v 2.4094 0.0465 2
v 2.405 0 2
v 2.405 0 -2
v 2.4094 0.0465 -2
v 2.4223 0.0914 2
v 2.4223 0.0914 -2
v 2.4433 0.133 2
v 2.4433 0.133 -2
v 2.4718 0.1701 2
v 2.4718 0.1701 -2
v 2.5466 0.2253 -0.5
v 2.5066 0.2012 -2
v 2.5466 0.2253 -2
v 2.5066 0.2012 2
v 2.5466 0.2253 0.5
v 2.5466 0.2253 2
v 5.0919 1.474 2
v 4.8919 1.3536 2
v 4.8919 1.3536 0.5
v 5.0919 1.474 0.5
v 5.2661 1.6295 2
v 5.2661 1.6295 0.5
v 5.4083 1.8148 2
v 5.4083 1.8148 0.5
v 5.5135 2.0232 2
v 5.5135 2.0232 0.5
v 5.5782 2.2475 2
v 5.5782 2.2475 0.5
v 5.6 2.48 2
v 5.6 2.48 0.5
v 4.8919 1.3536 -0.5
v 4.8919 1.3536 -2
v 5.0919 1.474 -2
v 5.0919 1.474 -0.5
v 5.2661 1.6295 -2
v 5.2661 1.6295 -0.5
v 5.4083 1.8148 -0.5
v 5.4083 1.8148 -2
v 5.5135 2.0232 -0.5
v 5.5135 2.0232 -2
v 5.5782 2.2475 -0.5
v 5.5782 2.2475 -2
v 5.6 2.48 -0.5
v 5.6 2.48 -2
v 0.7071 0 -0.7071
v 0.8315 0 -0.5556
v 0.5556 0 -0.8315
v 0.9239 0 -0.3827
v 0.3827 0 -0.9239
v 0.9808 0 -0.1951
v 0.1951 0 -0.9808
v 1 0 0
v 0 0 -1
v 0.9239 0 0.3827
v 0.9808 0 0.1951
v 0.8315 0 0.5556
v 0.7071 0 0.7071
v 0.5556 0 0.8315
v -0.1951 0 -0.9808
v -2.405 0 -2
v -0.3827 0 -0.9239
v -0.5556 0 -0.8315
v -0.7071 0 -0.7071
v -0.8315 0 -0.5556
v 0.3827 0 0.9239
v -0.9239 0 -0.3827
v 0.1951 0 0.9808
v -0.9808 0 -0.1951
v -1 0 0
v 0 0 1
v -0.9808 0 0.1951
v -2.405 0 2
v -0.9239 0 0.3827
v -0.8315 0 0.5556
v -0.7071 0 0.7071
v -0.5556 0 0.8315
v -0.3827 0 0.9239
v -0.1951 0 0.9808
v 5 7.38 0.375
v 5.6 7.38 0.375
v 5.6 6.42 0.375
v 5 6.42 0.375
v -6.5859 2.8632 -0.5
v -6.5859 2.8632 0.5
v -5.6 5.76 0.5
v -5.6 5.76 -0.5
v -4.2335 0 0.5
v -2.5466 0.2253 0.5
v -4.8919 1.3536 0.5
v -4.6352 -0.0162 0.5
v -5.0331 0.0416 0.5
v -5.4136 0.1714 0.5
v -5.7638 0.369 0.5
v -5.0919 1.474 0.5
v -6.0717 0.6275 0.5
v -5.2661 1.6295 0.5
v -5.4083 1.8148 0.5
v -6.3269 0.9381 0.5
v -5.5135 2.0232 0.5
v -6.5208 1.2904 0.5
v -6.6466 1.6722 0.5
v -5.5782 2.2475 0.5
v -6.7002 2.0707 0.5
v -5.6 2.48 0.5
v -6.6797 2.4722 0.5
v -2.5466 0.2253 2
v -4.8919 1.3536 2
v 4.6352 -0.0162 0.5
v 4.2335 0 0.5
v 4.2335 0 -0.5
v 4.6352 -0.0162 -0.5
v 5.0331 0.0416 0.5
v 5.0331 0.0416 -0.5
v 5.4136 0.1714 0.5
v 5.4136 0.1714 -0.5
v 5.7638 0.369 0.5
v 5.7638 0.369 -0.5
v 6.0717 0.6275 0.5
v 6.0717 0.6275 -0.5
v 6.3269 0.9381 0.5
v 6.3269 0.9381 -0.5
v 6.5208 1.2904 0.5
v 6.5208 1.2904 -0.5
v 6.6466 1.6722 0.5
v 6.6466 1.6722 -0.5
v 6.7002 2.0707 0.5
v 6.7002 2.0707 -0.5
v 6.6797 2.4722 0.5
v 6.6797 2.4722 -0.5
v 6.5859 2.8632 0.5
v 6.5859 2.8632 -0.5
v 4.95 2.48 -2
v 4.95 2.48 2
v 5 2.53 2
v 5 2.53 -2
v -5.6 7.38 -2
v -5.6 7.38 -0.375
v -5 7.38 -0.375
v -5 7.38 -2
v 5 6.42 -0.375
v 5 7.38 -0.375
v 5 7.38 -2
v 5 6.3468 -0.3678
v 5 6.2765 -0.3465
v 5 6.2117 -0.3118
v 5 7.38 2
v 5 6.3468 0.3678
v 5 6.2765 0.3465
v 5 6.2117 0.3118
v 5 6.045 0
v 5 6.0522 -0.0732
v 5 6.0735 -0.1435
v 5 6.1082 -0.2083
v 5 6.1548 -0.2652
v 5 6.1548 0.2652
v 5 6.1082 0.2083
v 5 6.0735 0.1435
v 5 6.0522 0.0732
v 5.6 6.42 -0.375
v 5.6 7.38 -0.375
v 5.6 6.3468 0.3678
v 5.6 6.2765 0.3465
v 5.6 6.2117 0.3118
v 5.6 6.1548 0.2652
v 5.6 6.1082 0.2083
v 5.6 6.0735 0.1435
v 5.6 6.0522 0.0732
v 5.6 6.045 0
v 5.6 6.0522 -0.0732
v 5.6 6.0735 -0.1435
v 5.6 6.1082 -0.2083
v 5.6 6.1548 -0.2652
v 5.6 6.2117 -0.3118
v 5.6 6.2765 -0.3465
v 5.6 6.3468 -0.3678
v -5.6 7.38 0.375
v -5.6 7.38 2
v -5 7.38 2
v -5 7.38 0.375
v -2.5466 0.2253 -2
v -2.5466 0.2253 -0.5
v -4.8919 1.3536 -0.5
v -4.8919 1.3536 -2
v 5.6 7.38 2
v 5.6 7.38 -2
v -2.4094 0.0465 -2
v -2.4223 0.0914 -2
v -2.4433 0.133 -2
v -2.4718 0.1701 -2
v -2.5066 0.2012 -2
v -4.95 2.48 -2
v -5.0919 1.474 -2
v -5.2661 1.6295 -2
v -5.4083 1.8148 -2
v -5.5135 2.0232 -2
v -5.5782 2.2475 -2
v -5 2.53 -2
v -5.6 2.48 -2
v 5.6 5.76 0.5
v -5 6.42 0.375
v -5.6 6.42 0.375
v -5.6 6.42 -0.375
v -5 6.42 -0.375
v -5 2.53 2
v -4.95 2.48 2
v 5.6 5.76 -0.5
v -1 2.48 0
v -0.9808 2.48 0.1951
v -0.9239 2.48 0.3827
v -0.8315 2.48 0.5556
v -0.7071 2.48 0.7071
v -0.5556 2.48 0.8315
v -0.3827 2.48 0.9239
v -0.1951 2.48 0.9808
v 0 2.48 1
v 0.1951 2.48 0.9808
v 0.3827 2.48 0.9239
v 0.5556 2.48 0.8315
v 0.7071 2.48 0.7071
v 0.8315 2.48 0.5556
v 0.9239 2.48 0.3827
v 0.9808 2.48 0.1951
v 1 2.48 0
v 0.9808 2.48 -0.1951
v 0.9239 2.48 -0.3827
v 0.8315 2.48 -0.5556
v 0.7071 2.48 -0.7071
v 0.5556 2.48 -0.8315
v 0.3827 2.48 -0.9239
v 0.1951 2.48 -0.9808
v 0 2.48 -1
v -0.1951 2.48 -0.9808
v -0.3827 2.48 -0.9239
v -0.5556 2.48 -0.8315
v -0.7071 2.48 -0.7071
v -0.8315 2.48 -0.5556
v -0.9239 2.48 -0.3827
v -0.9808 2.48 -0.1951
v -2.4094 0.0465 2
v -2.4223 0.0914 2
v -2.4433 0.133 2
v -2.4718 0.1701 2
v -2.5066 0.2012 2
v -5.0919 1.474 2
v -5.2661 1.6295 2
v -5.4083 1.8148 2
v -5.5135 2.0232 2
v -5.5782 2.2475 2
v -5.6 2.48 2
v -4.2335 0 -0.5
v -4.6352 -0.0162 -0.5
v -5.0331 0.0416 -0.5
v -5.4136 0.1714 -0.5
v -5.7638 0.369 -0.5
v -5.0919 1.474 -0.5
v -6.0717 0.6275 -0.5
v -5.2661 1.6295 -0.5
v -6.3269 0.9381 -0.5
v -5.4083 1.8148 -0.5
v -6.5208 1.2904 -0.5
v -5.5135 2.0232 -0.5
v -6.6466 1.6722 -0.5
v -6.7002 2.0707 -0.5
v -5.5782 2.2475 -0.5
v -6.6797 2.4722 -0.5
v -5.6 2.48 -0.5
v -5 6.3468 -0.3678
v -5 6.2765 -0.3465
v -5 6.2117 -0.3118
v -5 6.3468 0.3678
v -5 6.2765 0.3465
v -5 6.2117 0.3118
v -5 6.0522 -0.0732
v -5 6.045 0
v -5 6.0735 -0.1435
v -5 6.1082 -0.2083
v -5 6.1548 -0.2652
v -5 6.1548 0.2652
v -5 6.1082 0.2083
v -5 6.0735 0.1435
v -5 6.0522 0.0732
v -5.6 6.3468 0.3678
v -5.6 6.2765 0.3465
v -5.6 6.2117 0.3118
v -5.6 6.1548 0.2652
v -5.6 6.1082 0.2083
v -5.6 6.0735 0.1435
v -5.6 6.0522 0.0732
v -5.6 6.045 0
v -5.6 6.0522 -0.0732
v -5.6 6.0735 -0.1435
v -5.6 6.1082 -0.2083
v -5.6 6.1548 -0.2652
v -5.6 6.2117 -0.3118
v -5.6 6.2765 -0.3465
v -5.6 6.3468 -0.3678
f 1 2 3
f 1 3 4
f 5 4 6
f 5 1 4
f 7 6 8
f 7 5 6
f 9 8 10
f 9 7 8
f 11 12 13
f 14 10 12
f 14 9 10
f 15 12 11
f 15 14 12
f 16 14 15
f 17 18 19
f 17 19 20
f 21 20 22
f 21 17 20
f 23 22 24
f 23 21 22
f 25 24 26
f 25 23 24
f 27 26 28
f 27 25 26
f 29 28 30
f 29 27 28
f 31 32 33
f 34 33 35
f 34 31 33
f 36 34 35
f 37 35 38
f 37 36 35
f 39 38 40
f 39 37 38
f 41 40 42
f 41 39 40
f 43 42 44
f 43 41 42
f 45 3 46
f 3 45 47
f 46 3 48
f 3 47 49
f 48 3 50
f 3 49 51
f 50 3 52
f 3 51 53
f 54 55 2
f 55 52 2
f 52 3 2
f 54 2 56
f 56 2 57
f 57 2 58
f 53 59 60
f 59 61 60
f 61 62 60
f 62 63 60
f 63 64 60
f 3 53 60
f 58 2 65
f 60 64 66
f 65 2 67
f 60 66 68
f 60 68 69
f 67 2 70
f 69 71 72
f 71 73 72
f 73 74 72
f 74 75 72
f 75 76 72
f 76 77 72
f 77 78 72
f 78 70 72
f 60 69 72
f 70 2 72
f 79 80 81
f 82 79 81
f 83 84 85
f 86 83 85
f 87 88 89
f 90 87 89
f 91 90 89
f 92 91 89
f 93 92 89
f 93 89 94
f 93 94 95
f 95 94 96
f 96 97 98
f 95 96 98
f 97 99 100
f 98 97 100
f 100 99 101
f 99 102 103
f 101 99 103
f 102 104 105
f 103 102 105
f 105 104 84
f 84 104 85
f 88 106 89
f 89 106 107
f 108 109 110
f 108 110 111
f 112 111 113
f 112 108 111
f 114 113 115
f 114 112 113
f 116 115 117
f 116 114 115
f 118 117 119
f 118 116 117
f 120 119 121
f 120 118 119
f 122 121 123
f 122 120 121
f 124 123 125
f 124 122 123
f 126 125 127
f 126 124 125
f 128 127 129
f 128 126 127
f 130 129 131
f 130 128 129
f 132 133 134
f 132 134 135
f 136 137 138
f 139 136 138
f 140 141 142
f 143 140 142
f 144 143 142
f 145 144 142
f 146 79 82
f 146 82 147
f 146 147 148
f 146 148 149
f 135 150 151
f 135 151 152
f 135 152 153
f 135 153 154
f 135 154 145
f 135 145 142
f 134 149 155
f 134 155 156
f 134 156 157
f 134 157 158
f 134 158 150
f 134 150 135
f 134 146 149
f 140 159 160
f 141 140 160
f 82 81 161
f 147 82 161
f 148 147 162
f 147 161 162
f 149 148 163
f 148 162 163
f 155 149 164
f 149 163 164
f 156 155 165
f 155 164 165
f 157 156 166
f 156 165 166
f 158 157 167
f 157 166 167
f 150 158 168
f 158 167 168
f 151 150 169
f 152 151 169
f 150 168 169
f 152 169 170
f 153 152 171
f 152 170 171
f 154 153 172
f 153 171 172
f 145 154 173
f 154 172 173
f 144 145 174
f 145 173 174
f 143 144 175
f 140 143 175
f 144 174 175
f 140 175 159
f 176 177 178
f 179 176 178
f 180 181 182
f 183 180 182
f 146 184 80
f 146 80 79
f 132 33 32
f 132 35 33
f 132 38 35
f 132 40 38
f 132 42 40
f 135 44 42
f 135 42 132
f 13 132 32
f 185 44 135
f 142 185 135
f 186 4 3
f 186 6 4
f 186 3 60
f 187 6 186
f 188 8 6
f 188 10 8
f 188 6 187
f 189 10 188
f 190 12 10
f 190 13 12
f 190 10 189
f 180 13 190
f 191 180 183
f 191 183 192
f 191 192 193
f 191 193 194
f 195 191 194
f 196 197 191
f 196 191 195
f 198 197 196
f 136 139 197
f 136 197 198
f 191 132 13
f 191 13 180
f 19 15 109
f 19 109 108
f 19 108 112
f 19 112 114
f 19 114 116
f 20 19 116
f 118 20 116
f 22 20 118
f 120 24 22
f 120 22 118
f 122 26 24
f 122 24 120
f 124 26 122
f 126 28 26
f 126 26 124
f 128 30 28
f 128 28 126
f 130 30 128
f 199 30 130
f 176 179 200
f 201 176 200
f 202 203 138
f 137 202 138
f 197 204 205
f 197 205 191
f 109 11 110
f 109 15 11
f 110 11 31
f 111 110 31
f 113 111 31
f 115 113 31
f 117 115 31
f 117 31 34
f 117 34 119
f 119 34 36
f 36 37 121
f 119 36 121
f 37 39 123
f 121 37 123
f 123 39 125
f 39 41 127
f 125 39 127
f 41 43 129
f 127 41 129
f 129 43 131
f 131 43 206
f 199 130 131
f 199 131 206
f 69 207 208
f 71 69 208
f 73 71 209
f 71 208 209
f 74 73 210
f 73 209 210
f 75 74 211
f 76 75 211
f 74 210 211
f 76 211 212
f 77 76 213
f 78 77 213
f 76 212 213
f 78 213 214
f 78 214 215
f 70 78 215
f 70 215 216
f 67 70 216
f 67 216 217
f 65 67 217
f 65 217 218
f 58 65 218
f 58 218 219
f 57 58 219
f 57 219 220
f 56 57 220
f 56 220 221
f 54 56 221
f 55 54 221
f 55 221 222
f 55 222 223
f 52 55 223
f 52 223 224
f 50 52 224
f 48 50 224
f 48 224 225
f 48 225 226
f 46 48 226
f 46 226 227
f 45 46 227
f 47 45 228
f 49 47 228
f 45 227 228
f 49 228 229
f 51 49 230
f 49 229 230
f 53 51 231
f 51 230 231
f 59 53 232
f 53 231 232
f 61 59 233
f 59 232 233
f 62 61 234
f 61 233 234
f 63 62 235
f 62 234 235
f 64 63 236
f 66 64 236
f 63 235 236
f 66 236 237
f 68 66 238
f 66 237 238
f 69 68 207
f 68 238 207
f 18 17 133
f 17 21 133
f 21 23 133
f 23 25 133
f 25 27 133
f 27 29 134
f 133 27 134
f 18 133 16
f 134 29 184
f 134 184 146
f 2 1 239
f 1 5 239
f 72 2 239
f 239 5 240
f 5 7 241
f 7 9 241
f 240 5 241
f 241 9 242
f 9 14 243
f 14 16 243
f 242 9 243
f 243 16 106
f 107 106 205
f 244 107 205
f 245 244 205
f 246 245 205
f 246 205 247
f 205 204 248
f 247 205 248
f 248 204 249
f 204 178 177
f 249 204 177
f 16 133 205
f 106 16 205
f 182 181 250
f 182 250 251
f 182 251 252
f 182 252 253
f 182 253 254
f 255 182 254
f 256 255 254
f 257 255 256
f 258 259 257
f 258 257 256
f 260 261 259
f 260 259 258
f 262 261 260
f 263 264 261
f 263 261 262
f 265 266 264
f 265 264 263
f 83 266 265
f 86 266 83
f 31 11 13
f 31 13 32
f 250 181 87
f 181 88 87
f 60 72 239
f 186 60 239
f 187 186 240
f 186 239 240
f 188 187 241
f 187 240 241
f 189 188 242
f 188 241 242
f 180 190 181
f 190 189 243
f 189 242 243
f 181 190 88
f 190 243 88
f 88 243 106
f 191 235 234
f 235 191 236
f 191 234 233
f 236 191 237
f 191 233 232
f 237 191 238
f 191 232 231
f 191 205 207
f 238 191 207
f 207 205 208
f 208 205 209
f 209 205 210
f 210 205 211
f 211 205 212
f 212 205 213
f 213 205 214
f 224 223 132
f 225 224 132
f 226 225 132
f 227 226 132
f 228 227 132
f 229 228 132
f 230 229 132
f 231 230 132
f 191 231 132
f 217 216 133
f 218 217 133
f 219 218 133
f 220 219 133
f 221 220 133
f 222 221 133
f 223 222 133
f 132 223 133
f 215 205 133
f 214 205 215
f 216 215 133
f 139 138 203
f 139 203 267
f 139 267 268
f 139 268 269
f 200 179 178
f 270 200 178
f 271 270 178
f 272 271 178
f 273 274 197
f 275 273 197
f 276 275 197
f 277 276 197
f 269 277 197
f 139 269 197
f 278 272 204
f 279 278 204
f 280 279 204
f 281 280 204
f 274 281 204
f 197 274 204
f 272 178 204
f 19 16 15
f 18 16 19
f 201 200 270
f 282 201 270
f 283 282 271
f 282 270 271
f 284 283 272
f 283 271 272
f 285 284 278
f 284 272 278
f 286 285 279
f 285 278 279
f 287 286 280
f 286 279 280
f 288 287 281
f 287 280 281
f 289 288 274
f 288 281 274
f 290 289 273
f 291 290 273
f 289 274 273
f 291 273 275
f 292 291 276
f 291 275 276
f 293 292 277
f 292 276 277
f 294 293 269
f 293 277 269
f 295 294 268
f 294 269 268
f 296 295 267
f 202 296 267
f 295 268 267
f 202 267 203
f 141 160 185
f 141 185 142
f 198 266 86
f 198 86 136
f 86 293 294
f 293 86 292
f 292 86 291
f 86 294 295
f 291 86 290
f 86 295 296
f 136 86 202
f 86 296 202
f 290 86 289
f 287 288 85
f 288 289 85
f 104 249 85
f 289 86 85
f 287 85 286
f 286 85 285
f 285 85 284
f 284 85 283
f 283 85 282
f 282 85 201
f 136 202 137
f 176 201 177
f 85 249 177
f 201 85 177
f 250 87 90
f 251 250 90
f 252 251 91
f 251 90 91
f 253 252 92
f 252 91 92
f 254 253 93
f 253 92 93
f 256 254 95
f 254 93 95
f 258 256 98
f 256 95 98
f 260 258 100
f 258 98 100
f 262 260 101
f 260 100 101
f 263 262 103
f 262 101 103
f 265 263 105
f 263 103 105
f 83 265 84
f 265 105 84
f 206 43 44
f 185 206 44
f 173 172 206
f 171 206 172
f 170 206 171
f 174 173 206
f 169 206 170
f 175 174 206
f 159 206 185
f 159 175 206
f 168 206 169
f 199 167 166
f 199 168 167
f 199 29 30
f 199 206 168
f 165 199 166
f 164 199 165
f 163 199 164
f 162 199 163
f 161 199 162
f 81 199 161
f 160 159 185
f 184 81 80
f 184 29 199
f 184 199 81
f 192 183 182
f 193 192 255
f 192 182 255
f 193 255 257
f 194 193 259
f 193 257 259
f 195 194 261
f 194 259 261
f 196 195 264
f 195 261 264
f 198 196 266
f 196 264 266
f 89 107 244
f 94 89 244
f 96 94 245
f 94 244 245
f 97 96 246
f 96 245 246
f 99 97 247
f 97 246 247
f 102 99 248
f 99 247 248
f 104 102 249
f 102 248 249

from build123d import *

# Parameters (mm, degrees)
BOSS_EXTRUDE1_DEPTH = 2
CHAMFER1_SIZE       = 0.05
BOSS_EXTRUDE2_DEPTH = 0.5
CUT_EXTRUDE1_DEPTH  = 15.484682492
SKETCH5_R           = 1
CUT_EXTRUDE2_DEPTH  = 9.539796483


with BuildPart() as part:
    # Sketch1 → Boss-Extrude1 (new, symmetric)
    with BuildSketch(Plane.XY):
        with BuildLine():
            Line((0, 0), (2.405, 0))
            ThreePointArc((2.405, 0), (2.443345275, 0.133049905), (2.546618218, 0.225285129))
            Line((2.546618218, 0.225285129), (4.891908909, 1.353574355))
            ThreePointArc((4.891908909, 1.353574355), (5.408273626, 1.814750474), (5.6, 2.48))
            Line((5.6, 2.48), (5.6, 7.38))
            Line((5.6, 7.38), (5, 7.38))
            Line((5, 7.38), (5, 2.48))
            Line((5, 2.48), (0, 2.48))
            Line((0, 2.48), (0, 0))
        make_face()
    boss_extrude1 = extrude(amount=BOSS_EXTRUDE1_DEPTH, both=True)

    # Mirror1: Boss-Extrude1 across plane
    add(boss_extrude1.mirror(Plane(origin=(0, 0, 0), x_dir=(0, 0, 1), z_dir=(1, 0, 0))))

    # Chamfer1
    chamfer1_edges = [part.edges().sort_by_distance(p)[0] for p in [
        (5, 2.48, 0),
        (-5, 2.48, 0),
    ]]
    chamfer(chamfer1_edges, length=CHAMFER1_SIZE)

    # Sketch3 → Boss-Extrude2 (add, symmetric)
    with BuildSketch(Plane.XY):
        with BuildLine():
            Line((2.546618218, 0.225285129), (4.233522805, 0))
            ThreePointArc((4.233522805, 0), (6.206510258, 0.776923649), (6.585860055, 2.863160351))
            Line((6.585860055, 2.863160351), (5.6, 5.76))
            Line((5.6, 5.76), (5.6, 2.48))
            ThreePointArc((5.6, 2.48), (5.408273626, 1.814750474), (4.891908909, 1.353574355))
            Line((4.891908909, 1.353574355), (2.546618218, 0.225285129))
        make_face()
    boss_extrude2 = extrude(amount=BOSS_EXTRUDE2_DEPTH, both=True)

    # Mirror2: Boss-Extrude2 across plane
    add(boss_extrude2.mirror(Plane(origin=(0, 0, 0), x_dir=(0, 0, 1), z_dir=(1, 0, 0))))

    # Sketch4 → Cut-Extrude1 (cut, through all)
    with BuildSketch(Plane(origin=(5.6, 0, 0), x_dir=(0, 0, -1), z_dir=(1, 0, 0))):
        with BuildLine():
            Line((0.375, 6.42), (0.375, 7.38))
            Line((0.375, 7.38), (-0.375, 7.38))
            Line((-0.375, 7.38), (-0.375, 6.42))
            ThreePointArc((-0.375, 6.42), (0, 6.045), (0.375, 6.42))
        make_face()
    extrude(amount=-CUT_EXTRUDE1_DEPTH, mode=Mode.SUBTRACT)

    # Sketch5 → Cut-Extrude2 (cut, through all)
    with BuildSketch(Plane(origin=(0, 2.48, 0), x_dir=(1, 0, 0), z_dir=(0, 1, 0))):
        with Locations(Location((0, 0, 0), (0, 0, 180))):
            Circle(SKETCH5_R)
    extrude(amount=-CUT_EXTRUDE2_DEPTH, mode=Mode.SUBTRACT)


solid = part.part
